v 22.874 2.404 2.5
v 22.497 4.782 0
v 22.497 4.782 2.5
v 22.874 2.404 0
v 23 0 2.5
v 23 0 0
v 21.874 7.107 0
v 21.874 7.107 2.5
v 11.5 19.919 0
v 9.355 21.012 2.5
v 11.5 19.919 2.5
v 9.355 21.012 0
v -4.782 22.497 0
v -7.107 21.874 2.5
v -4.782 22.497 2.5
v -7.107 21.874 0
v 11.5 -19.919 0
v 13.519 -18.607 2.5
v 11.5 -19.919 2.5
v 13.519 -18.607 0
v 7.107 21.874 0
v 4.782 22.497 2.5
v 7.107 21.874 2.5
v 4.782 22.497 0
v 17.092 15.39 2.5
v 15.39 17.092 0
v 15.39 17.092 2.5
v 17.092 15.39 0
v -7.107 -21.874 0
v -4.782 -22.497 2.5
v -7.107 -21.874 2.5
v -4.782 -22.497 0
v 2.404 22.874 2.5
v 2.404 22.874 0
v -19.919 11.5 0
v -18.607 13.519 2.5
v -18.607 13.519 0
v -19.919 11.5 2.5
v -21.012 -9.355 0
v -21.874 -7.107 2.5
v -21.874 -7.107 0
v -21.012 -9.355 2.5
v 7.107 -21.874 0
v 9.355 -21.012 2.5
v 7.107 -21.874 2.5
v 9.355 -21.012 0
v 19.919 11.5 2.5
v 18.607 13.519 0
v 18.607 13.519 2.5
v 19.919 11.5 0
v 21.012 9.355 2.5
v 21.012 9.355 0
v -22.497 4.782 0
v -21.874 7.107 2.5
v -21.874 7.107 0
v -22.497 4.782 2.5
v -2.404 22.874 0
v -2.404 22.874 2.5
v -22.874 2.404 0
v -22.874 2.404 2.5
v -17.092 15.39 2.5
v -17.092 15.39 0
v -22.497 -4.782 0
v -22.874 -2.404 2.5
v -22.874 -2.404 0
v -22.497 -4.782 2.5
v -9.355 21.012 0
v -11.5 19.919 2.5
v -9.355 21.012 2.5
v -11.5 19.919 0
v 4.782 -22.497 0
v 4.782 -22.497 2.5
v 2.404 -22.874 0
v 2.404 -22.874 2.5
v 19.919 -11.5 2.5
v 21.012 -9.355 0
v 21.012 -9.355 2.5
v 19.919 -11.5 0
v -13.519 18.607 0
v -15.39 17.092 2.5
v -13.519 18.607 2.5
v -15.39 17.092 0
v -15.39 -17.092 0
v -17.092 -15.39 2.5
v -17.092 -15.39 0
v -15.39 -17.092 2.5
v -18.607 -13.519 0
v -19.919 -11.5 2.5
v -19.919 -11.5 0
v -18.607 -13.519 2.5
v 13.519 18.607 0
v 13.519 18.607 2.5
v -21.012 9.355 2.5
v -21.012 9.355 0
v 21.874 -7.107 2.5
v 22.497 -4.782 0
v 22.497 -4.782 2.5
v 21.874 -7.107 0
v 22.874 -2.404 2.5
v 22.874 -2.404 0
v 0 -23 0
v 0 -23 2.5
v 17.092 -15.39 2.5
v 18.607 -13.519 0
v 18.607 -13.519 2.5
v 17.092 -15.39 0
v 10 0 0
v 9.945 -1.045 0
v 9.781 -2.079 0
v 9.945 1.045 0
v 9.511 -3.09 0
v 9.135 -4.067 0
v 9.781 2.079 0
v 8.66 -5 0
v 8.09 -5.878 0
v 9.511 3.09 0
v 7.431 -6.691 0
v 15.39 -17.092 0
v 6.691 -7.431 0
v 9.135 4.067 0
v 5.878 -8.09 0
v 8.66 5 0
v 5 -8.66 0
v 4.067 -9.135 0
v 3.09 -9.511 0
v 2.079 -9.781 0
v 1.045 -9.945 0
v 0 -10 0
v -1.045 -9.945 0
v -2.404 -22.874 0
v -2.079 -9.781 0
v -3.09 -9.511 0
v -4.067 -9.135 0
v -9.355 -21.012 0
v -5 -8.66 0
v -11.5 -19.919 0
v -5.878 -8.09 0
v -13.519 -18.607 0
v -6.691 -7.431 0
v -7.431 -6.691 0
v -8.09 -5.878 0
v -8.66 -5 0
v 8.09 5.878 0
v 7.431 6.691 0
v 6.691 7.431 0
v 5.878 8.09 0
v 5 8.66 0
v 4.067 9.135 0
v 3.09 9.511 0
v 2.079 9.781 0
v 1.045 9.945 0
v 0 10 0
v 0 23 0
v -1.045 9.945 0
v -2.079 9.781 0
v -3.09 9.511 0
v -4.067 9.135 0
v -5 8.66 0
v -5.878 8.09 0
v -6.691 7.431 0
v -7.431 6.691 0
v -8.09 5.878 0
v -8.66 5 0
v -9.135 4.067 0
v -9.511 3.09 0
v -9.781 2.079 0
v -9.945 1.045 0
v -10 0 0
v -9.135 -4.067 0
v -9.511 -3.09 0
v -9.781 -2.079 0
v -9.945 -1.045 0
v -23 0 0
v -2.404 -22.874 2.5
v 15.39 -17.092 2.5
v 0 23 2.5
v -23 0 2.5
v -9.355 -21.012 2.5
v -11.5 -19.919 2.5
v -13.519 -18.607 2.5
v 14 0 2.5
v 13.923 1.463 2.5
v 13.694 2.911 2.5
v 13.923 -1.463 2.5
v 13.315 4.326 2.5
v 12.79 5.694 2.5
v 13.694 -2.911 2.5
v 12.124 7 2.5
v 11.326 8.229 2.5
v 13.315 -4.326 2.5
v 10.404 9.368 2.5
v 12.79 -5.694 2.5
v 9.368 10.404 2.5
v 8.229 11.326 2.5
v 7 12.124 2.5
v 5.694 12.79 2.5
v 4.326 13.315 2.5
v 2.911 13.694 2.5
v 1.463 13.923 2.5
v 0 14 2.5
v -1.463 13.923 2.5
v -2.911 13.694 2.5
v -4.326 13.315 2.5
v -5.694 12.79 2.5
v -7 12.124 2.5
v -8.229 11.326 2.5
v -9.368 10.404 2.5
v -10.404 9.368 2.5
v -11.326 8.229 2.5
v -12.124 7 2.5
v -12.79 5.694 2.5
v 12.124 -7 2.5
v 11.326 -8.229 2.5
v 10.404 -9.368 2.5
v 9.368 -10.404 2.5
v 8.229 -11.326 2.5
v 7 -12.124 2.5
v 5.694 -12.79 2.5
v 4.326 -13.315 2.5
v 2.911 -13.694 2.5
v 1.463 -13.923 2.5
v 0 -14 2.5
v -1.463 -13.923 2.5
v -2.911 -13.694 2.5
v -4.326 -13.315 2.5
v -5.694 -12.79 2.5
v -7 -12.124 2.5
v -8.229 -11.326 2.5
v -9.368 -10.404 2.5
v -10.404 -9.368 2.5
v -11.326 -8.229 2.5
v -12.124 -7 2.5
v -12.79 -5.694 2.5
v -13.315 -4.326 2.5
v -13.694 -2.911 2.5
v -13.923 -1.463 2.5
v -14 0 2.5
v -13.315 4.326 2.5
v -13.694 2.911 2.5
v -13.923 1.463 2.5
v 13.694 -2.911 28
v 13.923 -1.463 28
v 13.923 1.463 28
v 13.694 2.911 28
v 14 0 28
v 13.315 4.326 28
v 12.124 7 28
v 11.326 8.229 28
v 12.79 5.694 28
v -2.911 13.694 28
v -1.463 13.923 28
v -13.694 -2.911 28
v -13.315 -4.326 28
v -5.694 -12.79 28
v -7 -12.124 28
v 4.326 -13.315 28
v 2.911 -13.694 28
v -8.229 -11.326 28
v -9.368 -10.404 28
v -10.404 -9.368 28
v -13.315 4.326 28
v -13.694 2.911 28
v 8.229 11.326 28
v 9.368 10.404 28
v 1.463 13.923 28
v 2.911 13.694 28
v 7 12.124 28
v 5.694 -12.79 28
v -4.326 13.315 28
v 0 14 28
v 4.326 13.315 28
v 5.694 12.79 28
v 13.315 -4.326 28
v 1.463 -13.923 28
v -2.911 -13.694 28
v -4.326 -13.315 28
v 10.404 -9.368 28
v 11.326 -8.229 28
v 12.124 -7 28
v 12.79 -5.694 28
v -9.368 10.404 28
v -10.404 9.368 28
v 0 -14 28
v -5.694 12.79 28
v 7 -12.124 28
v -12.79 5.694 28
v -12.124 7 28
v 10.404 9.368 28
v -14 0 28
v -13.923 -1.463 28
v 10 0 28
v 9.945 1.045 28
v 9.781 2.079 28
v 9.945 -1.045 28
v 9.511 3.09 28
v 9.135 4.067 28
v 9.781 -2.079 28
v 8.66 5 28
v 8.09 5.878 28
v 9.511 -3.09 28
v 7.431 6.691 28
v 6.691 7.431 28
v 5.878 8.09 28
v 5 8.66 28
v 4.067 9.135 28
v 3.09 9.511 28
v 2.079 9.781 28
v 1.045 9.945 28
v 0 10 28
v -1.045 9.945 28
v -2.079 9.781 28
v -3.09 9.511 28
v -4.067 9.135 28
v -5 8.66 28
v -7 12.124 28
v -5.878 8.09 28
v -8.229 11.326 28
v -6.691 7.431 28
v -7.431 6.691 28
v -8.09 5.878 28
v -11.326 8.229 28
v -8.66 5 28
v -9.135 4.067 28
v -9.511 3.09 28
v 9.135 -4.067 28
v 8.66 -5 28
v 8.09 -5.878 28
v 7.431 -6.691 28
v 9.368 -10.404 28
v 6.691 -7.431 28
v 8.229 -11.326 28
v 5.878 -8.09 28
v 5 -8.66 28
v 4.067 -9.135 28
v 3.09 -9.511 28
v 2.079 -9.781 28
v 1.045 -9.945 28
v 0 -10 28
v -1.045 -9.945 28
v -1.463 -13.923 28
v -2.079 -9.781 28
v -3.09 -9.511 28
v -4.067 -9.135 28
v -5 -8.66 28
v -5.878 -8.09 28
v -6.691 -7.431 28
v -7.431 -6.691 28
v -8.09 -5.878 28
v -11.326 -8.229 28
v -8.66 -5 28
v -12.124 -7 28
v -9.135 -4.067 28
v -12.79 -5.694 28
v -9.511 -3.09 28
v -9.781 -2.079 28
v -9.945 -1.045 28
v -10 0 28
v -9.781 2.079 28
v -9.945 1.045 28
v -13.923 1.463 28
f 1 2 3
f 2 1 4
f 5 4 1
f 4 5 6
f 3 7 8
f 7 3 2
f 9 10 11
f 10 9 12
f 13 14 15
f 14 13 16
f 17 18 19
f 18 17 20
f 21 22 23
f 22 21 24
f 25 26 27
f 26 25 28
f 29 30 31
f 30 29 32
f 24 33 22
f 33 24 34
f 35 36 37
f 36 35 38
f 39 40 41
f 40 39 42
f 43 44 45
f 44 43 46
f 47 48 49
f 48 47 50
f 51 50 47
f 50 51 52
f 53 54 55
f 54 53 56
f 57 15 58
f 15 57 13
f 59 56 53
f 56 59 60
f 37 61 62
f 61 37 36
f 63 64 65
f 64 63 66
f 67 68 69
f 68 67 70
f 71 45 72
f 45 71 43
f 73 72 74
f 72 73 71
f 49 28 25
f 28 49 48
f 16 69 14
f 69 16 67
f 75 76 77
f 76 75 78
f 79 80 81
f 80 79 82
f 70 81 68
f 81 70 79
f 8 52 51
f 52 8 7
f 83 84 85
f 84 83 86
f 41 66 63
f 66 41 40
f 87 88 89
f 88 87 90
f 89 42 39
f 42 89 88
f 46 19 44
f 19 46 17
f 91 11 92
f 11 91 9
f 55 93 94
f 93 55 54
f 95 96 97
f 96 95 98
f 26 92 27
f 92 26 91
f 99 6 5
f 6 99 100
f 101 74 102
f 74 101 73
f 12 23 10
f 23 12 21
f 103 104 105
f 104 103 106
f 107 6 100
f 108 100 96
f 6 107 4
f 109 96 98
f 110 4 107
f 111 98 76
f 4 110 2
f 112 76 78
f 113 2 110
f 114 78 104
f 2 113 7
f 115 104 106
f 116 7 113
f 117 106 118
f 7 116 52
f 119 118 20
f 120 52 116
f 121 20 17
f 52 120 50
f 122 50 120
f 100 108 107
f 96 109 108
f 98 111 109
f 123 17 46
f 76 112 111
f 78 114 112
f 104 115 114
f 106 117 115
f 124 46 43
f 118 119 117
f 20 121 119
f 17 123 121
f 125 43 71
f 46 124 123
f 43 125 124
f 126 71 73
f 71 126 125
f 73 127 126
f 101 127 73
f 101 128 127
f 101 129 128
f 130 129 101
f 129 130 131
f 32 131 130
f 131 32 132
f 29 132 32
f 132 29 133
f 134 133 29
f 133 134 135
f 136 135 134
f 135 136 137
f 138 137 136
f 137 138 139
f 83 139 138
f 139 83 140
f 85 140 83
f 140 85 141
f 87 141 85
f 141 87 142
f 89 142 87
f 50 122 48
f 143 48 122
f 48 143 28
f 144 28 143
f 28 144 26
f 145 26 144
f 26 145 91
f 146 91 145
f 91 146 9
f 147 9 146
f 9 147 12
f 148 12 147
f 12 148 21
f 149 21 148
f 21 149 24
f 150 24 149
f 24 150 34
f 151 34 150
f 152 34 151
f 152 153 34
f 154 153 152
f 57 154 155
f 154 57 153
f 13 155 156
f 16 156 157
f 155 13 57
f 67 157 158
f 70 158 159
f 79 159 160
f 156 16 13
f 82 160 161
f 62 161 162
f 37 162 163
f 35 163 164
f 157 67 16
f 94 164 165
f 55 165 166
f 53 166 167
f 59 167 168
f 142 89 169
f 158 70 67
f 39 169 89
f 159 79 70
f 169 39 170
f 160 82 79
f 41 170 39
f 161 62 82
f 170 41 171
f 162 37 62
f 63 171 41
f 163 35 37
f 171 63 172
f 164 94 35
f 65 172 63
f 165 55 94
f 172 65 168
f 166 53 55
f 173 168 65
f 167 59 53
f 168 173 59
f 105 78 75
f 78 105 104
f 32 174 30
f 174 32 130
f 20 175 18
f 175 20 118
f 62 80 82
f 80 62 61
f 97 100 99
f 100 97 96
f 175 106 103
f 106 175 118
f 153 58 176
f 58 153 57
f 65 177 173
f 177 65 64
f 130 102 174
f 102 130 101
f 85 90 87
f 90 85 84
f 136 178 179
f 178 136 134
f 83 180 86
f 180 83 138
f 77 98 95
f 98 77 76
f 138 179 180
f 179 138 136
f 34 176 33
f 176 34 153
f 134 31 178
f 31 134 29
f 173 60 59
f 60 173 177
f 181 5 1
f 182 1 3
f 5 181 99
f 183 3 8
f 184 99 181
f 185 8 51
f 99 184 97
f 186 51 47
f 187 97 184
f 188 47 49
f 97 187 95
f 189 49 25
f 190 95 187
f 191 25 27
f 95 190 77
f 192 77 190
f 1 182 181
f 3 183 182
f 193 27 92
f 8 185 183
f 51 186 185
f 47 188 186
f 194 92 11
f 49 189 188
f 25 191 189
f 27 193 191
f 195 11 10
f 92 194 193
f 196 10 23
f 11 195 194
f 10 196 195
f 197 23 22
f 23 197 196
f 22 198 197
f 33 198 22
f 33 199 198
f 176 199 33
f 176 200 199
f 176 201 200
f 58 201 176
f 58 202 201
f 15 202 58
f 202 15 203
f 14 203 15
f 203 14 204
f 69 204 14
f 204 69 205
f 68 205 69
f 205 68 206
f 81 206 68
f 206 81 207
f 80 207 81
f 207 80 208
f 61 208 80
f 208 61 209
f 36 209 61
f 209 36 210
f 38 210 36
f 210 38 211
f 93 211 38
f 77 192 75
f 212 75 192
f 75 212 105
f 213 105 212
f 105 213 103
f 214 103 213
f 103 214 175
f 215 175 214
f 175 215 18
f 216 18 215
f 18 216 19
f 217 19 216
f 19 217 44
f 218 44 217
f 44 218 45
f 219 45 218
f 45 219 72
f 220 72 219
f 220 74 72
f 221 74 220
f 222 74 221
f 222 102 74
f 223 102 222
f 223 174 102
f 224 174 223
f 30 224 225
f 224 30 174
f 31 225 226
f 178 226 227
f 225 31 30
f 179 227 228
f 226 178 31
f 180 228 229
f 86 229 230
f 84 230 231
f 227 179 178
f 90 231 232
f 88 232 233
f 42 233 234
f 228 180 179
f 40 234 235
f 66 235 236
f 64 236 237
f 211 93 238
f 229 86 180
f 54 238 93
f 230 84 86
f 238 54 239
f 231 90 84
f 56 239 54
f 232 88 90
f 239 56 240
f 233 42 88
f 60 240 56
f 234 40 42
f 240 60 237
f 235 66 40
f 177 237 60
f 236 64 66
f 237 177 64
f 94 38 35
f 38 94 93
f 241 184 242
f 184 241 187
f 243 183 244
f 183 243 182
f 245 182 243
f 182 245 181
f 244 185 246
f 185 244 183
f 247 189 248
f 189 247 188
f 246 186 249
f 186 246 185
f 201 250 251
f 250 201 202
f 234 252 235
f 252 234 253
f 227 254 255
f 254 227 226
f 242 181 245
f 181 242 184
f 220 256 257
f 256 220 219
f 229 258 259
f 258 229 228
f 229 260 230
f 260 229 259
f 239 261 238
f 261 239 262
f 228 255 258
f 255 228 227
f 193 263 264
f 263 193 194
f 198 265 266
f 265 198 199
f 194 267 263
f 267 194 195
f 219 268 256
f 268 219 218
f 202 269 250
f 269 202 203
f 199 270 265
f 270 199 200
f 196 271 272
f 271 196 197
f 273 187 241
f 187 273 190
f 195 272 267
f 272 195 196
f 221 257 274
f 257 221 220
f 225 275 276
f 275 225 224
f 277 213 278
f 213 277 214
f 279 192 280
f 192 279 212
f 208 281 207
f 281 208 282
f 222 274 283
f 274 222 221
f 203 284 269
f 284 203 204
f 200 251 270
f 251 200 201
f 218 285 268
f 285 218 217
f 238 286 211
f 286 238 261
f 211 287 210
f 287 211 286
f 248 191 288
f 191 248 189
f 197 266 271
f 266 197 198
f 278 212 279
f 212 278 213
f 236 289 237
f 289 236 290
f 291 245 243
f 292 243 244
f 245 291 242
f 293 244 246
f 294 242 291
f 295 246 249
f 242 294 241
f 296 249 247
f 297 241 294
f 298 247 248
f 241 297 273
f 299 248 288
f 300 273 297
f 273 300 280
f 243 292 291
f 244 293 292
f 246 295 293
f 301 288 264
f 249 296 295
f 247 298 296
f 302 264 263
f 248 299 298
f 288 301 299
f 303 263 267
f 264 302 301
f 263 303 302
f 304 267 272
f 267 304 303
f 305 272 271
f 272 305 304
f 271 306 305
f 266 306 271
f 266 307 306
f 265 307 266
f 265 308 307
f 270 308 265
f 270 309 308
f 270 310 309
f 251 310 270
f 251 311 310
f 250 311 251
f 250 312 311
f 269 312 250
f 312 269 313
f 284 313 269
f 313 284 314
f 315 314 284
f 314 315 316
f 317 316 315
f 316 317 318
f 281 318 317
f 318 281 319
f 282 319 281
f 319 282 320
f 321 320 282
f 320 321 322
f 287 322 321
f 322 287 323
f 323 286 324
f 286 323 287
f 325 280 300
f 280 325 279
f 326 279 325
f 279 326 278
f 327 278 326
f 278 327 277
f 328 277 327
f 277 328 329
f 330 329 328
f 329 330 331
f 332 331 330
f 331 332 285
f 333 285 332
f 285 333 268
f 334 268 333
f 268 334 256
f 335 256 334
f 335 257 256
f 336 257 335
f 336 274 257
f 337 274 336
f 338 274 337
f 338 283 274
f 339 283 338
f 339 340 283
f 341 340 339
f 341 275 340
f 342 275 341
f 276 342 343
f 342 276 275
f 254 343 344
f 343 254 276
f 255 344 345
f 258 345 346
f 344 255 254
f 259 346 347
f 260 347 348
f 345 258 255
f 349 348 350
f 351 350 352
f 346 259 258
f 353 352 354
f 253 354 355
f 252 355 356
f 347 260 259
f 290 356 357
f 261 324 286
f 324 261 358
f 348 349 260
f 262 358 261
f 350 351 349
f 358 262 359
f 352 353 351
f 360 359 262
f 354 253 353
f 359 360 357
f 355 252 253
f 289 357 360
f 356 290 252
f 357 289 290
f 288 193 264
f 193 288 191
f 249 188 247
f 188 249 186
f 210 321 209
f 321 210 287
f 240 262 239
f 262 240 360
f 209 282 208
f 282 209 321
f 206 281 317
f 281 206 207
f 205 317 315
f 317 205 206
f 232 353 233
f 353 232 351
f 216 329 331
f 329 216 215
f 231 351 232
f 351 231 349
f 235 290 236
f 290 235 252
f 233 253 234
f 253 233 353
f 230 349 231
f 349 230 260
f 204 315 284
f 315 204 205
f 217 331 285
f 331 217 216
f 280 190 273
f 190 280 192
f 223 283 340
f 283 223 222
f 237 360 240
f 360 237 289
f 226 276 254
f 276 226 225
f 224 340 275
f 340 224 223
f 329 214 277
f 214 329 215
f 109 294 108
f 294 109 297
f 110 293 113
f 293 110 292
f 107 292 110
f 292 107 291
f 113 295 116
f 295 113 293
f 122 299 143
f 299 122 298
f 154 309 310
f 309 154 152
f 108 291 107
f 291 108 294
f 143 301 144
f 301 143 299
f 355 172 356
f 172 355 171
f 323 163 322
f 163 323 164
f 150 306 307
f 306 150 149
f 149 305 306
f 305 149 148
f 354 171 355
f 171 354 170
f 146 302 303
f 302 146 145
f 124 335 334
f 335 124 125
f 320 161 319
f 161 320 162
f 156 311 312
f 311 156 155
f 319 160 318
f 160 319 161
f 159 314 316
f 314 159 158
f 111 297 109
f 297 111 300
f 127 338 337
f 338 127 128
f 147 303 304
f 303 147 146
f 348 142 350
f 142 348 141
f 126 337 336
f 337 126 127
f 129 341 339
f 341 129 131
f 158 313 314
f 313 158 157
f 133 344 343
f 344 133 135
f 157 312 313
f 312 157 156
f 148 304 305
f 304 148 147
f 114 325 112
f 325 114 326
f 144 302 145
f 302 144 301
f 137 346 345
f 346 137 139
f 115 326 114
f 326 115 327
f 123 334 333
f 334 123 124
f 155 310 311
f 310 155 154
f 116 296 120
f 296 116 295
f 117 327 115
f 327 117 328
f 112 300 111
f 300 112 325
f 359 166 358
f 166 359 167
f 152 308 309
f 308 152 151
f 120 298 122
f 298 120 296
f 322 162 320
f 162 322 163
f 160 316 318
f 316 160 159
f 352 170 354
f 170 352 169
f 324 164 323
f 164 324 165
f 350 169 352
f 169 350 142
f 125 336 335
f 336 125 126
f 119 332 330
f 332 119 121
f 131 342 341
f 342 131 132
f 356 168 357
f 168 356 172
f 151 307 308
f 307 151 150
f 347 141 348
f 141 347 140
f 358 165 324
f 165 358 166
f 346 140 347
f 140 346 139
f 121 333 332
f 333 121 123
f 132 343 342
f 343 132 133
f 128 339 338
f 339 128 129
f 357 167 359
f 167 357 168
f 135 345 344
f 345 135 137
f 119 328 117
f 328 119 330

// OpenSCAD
// Flanged sleeve bushing.
$fn = 60;
eps = 0.02;
inner_d = 20;
outer_d = 28;
length = 28;
flange_d = 46;
flange_t = 2.5;
difference() {
    union() {
        cylinder(d = flange_d, h = flange_t);
        cylinder(d = outer_d, h = length);
    }
    translate([0, 0, -eps]) cylinder(d = inner_d, h = length + 2 * eps);
}
